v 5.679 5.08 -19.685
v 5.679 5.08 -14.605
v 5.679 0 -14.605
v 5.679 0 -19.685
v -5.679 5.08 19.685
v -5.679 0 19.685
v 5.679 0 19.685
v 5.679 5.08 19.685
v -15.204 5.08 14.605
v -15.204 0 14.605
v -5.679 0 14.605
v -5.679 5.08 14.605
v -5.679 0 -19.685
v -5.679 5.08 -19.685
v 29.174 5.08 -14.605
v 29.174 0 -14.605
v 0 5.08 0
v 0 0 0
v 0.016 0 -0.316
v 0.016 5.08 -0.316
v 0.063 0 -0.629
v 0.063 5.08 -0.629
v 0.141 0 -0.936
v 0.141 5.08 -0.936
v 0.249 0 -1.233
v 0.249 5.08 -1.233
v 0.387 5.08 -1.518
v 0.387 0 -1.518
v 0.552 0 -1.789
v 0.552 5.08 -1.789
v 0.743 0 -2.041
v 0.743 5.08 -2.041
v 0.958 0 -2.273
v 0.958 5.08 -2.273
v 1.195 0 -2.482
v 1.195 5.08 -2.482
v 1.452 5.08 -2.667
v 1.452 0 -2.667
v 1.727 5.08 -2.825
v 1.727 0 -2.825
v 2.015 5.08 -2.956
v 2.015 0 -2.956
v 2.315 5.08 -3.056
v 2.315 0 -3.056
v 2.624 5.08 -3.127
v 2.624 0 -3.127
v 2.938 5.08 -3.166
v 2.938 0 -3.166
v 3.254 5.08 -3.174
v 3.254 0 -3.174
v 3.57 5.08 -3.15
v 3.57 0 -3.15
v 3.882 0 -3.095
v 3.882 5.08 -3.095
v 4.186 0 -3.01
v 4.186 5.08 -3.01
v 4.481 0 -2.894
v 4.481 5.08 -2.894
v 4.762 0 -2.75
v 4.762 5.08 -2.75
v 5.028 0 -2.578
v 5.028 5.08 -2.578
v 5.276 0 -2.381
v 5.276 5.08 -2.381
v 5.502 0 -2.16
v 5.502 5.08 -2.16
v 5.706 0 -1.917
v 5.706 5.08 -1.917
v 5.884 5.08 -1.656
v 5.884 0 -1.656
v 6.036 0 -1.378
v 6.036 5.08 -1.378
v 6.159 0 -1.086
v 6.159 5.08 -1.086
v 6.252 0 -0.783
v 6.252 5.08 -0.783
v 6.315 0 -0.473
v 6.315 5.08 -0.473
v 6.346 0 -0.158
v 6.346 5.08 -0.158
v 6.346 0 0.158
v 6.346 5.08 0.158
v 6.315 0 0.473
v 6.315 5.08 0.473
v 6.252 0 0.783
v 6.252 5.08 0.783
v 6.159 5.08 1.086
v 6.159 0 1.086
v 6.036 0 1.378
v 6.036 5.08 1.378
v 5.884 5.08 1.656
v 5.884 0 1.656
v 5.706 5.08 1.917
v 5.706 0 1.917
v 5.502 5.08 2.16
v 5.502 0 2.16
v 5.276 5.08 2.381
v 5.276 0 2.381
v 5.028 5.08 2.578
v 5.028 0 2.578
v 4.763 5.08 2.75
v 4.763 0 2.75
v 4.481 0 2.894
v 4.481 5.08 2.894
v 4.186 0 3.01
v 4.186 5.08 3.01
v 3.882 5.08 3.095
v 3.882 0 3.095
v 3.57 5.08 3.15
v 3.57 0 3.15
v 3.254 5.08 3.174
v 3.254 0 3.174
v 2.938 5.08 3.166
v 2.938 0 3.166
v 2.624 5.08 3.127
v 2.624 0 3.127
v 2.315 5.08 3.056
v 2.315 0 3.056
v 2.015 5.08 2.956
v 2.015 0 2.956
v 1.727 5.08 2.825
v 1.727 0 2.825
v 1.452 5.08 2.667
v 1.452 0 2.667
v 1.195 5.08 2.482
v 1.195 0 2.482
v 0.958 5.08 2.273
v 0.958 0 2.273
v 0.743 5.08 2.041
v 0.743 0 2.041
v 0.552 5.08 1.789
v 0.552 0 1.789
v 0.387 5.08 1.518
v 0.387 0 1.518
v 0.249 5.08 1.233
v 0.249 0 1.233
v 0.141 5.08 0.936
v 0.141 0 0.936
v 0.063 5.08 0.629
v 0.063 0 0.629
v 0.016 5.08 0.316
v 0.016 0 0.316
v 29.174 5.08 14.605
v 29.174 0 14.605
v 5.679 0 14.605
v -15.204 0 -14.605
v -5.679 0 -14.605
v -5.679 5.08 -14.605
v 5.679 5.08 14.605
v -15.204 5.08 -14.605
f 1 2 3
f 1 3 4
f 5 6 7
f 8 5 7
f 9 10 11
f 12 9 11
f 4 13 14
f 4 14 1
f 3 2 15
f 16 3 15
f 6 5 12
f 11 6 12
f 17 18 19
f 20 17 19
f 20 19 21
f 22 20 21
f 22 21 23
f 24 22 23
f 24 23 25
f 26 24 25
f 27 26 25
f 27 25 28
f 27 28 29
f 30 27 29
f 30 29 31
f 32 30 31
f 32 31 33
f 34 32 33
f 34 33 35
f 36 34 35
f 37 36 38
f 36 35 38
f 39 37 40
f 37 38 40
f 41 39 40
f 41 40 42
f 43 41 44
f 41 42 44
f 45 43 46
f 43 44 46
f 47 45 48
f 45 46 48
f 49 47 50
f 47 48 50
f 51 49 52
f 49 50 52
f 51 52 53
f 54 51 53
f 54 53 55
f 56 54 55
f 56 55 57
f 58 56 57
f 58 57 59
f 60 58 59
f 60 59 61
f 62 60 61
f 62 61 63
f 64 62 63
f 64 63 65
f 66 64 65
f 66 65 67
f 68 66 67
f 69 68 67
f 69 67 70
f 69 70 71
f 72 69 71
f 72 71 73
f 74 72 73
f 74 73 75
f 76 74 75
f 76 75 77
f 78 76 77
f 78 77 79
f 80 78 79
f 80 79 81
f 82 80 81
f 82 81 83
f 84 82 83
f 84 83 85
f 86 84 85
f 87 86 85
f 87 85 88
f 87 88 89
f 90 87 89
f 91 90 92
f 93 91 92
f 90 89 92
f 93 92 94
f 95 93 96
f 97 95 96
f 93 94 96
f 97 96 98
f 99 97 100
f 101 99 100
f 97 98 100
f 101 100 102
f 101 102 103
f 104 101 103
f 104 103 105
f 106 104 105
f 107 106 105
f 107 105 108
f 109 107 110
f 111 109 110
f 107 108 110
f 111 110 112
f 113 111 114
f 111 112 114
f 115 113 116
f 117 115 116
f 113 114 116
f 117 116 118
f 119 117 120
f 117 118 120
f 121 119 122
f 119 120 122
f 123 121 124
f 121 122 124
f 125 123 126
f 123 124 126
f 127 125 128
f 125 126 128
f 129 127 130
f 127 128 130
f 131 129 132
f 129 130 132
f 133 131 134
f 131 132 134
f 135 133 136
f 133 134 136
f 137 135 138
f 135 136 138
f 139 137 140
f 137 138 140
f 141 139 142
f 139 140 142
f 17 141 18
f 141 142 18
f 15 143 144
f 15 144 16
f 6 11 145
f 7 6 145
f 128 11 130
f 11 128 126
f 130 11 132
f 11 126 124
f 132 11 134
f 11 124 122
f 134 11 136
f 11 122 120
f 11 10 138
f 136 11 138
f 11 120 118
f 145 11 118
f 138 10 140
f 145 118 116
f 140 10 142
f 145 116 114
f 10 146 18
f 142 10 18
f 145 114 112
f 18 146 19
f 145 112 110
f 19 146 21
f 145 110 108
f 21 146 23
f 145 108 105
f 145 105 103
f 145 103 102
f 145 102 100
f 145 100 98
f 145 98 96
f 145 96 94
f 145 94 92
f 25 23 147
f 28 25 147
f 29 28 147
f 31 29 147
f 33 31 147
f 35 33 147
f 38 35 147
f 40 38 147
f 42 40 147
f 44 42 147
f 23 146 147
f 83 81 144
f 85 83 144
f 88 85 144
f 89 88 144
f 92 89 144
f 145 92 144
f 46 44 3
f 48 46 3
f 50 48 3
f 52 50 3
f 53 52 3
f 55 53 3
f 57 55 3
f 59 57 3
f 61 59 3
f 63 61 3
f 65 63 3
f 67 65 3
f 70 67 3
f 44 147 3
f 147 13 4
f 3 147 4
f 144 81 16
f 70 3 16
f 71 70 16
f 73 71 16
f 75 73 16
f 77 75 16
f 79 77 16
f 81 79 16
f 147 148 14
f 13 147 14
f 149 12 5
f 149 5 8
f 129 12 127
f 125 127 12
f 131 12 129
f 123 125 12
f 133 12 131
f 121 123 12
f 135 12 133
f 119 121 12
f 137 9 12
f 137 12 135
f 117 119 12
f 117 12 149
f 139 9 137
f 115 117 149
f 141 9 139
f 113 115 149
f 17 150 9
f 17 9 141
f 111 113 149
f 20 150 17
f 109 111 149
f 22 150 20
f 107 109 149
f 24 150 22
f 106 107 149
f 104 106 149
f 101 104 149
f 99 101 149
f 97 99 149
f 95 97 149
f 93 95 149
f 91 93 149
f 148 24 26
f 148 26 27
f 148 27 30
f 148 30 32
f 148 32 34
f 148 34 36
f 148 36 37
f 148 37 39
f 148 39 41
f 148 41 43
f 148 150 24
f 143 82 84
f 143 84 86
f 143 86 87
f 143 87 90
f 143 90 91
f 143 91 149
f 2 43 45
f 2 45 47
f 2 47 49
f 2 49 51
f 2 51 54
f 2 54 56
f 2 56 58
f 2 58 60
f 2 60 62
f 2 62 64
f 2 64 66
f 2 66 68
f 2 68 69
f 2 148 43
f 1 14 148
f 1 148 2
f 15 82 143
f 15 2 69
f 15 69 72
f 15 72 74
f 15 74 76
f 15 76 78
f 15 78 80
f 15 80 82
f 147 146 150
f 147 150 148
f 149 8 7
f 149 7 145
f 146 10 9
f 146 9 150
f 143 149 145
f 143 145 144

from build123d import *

# Parameters (mm, degrees)
SKETCH1_W                   = 30.408879848
SKETCH1_H                   = 29.21
SKETCH1_W_2                 = 11.358879848
SKETCH1_H_2                 = 5.08
BOSS_EXTRUDE1_DEPTH         = 5.08
F_1_4_0_25_DIAMETER_HOLE1_D = 6.35
SKETCH5_W                   = 13.97
SKETCH5_H                   = 29.21
BOSS_EXTRUDE2_DEPTH         = 5.08


with BuildPart() as part:
    # Sketch1 → Boss-Extrude1 (new body)
    with BuildSketch(Plane(origin=(0, 0, 0), x_dir=(1, 0, 0), z_dir=(0, 1, 0))):
        Rectangle(SKETCH1_W, SKETCH1_H)
        with Locations((0, 17.145)):
            Rectangle(SKETCH1_W_2, SKETCH1_H_2)
        with Locations((0, -17.145)):
            Rectangle(SKETCH1_W_2, SKETCH1_H_2)
    extrude(amount=BOSS_EXTRUDE1_DEPTH)

    # 1/4 (0.25) Diameter Hole1 (through all)
    with Locations(Plane(origin=(0, 5.08, 0), x_dir=(1, 0, 0), z_dir=(0, 1, 0))):
        with Locations((3.175, 0)):
            Hole(F_1_4_0_25_DIAMETER_HOLE1_D / 2)

    # Sketch5 → Boss-Extrude2 (add)
    with BuildSketch(Plane(origin=(0, 5.08, 0), x_dir=(1, 0, 0), z_dir=(0, 1, 0))):
        with Locations((22.189439924, 0)):
            Rectangle(SKETCH5_W, SKETCH5_H)
    extrude(amount=-BOSS_EXTRUDE2_DEPTH)


solid = part.part
